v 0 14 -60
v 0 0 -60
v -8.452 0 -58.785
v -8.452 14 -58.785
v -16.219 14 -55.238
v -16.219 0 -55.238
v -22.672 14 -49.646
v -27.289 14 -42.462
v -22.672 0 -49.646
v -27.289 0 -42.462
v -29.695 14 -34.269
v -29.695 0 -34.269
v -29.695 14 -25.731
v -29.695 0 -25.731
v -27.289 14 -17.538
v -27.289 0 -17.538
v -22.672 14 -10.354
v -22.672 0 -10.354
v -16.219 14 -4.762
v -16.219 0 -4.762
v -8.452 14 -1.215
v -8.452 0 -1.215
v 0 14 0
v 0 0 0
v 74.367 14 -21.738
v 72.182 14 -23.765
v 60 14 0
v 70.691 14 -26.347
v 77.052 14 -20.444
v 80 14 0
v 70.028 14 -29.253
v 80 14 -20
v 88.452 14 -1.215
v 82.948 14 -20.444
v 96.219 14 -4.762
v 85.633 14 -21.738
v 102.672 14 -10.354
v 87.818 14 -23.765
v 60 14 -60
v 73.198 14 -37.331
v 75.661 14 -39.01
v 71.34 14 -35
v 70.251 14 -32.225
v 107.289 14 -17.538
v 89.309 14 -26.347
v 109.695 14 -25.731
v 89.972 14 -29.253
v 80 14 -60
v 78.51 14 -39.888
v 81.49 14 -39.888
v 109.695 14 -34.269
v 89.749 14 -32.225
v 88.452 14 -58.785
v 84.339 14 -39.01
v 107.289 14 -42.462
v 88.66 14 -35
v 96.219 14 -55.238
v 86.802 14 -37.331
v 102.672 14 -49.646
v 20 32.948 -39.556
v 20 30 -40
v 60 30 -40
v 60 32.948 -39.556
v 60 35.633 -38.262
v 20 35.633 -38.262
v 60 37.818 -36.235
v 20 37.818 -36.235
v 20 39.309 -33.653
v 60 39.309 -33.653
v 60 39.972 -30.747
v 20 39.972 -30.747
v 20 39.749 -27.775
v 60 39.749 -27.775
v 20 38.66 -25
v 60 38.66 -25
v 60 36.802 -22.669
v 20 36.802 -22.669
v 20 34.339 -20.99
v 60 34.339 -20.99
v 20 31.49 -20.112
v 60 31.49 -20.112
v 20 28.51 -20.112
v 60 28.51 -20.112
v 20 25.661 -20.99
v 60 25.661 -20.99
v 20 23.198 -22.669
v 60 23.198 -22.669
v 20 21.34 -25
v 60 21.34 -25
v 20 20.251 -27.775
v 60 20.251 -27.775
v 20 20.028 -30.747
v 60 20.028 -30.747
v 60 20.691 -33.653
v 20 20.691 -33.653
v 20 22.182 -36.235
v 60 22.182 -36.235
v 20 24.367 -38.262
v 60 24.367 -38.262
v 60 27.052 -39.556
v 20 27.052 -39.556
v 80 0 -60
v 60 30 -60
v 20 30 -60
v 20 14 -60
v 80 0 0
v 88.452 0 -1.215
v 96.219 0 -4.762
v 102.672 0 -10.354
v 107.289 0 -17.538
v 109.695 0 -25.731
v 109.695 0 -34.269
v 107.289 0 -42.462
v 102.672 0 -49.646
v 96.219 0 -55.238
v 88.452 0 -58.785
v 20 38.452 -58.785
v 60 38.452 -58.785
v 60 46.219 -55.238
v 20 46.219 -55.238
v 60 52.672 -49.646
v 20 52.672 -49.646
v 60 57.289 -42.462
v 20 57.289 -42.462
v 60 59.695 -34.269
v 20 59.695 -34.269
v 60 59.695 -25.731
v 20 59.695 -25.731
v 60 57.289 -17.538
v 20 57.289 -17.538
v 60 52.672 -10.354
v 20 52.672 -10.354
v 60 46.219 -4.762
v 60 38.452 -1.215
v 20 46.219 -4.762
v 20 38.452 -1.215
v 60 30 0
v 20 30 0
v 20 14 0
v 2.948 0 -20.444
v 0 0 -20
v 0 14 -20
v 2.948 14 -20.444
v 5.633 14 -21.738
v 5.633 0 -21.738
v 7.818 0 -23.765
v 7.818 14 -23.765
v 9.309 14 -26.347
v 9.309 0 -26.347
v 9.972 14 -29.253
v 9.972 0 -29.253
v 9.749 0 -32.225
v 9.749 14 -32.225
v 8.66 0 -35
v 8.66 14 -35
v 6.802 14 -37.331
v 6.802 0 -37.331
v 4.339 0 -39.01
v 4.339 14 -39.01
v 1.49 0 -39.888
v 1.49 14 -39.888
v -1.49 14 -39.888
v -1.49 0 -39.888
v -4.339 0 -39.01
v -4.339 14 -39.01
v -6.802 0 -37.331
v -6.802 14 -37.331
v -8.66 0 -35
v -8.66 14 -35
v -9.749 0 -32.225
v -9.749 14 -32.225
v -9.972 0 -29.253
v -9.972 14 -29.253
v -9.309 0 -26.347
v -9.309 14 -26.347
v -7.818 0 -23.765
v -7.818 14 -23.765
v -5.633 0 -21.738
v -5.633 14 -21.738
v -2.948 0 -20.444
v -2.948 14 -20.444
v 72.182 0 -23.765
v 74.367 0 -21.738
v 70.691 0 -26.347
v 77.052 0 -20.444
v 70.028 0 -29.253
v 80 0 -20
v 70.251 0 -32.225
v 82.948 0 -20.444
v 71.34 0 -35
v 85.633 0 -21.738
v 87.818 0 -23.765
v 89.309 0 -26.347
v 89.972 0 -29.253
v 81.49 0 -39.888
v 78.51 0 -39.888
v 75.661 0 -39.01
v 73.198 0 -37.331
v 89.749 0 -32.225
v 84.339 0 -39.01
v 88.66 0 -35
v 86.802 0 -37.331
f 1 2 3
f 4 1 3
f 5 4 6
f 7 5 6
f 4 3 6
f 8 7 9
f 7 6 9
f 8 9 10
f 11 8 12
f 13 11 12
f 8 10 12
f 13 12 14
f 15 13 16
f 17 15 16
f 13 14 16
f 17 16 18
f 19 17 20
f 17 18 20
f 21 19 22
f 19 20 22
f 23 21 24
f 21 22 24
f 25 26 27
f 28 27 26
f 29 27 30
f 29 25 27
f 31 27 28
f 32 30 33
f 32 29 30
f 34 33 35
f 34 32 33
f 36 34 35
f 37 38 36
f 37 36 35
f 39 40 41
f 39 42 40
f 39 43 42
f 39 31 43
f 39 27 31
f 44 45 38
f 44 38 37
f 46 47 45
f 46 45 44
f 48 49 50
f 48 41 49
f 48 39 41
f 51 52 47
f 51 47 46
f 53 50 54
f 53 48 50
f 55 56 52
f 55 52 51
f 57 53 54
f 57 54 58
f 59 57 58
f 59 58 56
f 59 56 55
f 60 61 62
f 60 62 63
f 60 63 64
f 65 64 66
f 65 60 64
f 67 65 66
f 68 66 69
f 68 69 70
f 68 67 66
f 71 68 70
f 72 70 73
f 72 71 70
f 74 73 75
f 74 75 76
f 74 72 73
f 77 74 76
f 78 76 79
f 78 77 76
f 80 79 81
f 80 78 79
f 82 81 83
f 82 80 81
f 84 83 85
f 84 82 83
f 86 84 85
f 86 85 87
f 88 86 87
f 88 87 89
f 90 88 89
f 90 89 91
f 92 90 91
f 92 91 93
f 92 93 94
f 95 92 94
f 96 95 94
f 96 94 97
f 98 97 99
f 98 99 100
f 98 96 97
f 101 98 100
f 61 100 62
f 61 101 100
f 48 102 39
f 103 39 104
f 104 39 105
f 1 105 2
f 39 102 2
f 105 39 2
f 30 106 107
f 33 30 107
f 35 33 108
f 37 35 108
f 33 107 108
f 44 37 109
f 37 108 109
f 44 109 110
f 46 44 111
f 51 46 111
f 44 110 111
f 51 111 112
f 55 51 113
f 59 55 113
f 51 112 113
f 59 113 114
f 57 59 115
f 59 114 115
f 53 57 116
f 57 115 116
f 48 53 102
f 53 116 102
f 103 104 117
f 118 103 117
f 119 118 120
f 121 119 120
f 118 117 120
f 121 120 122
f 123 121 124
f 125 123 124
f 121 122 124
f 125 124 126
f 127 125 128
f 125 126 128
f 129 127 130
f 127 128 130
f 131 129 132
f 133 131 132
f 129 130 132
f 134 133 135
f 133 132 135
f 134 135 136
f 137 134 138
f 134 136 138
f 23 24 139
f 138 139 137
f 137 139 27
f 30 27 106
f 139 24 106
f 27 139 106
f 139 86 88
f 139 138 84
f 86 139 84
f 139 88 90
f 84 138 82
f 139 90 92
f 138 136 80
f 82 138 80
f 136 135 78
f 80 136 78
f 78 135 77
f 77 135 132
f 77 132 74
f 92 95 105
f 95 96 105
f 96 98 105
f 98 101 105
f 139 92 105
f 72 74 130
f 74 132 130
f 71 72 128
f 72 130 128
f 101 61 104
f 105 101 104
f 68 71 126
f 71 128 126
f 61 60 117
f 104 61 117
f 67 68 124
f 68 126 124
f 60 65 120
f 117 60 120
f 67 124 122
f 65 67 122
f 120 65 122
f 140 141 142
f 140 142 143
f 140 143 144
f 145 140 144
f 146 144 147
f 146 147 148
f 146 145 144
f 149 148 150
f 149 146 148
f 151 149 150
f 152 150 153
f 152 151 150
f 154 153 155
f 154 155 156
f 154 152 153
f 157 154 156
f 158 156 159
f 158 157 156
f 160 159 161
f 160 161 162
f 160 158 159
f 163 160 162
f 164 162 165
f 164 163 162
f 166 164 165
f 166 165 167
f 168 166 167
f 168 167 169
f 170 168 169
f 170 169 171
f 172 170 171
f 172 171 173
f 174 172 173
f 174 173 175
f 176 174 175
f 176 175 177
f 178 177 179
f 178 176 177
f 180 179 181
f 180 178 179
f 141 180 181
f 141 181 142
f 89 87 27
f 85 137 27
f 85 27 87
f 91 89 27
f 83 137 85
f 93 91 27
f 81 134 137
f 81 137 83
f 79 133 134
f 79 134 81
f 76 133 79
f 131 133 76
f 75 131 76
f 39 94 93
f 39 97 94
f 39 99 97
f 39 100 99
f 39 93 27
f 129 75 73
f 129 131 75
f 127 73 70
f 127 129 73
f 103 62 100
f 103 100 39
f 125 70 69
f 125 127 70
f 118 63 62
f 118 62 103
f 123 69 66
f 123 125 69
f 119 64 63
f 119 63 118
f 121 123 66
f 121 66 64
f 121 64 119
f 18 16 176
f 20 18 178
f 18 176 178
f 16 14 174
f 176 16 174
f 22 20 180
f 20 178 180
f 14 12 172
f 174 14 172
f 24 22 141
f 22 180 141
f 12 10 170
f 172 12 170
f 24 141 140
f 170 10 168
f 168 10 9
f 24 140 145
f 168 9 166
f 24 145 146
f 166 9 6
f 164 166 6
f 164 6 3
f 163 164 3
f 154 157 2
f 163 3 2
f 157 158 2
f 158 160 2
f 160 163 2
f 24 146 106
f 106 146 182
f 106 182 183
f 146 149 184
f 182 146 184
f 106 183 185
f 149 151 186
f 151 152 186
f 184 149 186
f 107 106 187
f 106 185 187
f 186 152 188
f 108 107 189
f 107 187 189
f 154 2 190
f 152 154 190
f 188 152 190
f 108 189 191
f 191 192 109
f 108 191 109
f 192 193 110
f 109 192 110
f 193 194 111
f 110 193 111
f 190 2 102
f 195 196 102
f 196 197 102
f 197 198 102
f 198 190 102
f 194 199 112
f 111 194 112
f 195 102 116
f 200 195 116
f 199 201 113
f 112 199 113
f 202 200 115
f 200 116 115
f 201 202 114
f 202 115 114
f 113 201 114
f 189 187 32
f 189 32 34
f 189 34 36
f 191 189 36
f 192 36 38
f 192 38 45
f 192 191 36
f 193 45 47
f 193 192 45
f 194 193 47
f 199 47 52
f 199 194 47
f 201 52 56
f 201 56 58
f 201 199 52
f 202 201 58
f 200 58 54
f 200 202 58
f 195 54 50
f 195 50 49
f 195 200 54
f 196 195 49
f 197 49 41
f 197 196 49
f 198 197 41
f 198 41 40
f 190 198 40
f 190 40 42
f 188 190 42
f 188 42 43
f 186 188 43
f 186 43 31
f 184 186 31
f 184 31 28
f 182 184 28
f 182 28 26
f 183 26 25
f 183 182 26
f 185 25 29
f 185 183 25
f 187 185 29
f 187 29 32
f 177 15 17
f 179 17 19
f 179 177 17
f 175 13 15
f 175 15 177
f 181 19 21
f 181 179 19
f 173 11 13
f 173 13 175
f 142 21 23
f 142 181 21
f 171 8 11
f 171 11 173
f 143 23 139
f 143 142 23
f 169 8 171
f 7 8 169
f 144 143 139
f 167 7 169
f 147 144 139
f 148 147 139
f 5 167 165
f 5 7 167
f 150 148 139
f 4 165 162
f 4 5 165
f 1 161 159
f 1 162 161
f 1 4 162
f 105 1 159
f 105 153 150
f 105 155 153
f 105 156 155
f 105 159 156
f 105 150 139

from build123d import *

# Parameters (mm, degrees)
CROQUIS1_R              = 10
SALIENTE_EXTRUIR1_DEPTH = 14
SALIENTE_EXTRUIR2_START = 20
CROQUIS5_R              = 10
SALIENTE_EXTRUIR2_DEPTH = 40


with BuildPart() as part:
    # Croquis1 → Saliente-Extruir1 (new body)
    with BuildSketch(Plane(origin=(0, 0, 0), x_dir=(1, 0, 0), z_dir=(0, 1, 0))):
        with BuildLine():
            Line((0, 0), (80, 0))
            ThreePointArc((80, 0), (110, 30), (80, 60))
            Line((80, 60), (0, 60))
            ThreePointArc((0, 60), (-30, 30), (0, 0))
        make_face()
        with Locations(Location((0, 30, 0), (0, 0, 270))):
            Circle(CROQUIS1_R, mode=Mode.SUBTRACT)
        with Locations(Location((80, 30, 0), (0, 0, 270))):
            Circle(CROQUIS1_R, mode=Mode.SUBTRACT)
    extrude(amount=SALIENTE_EXTRUIR1_DEPTH)

    # Croquis5 → Saliente-Extruir2 (add)
    with BuildSketch(Plane(origin=(0, 0, 0), x_dir=(0, 0, -1), z_dir=(1, 0, 0)).offset(SALIENTE_EXTRUIR2_START)):
        with BuildLine():
            Line((60, 14), (60, 30))
            ThreePointArc((60, 30), (30, 60), (0, 30))
            Line((0, 30), (0, 14))
            Line((0, 14), (60, 14))
        make_face()
        with Locations((30, 30)):
            Circle(CROQUIS5_R, mode=Mode.SUBTRACT)
    extrude(amount=SALIENTE_EXTRUIR2_DEPTH)


solid = part.part
